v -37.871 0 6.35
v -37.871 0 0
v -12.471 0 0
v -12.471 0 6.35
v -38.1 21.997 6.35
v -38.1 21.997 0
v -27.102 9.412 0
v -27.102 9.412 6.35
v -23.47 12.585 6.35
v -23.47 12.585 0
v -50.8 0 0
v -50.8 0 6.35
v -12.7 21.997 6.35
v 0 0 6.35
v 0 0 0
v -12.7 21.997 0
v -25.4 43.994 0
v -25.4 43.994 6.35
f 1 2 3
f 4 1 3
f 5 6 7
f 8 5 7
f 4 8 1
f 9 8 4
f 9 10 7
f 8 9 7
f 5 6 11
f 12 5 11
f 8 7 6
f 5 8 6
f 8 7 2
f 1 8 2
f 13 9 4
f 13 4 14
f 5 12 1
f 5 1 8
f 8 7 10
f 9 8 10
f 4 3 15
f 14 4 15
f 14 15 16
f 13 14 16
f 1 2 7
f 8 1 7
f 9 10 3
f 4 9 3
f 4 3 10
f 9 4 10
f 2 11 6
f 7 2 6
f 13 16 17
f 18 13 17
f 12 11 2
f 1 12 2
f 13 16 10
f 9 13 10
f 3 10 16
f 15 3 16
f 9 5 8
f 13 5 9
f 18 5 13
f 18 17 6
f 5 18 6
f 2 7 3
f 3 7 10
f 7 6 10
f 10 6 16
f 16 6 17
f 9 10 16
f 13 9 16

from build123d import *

# Parameters (mm, degrees)
F1_DEPTH = 6.35
F3_DEPTH = 6.35
F2_DEPTH = 6.35


with BuildPart() as f1:
    # F0 (on Top) → F1 (new body)
    with BuildSketch(Plane.XY):
        Polygon((-38.1, 21.997045), (-50.8, 0), (-37.871148, 0), (-27.101544, 9.411548), align=None)
        Polygon((-23.469604, 12.585497), (-12.471148, 0), (0, 0), (-12.7, 21.997045), align=None)
    extrude(amount=F1_DEPTH)


with BuildPart() as f3:
    # F0 (on Top) → F3 (new body)
    with BuildSketch(Plane.XY):
        Polygon((-25.4, 43.994091), (-38.1, 21.997045), (-27.101544, 9.411548), (-23.469604, 12.585497), (-12.7, 21.997045), align=None)
    extrude(amount=F3_DEPTH)


with BuildPart() as f2:
    # F0 (on Top) → F2 (new body)
    with BuildSketch(Plane.XY):
        Polygon((-27.101544, 9.411548), (-37.871148, 0), (-12.471148, 0), (-23.469604, 12.585497), align=None)
    extrude(amount=F2_DEPTH)


solid = Compound([f1.part, f3.part, f2.part])
